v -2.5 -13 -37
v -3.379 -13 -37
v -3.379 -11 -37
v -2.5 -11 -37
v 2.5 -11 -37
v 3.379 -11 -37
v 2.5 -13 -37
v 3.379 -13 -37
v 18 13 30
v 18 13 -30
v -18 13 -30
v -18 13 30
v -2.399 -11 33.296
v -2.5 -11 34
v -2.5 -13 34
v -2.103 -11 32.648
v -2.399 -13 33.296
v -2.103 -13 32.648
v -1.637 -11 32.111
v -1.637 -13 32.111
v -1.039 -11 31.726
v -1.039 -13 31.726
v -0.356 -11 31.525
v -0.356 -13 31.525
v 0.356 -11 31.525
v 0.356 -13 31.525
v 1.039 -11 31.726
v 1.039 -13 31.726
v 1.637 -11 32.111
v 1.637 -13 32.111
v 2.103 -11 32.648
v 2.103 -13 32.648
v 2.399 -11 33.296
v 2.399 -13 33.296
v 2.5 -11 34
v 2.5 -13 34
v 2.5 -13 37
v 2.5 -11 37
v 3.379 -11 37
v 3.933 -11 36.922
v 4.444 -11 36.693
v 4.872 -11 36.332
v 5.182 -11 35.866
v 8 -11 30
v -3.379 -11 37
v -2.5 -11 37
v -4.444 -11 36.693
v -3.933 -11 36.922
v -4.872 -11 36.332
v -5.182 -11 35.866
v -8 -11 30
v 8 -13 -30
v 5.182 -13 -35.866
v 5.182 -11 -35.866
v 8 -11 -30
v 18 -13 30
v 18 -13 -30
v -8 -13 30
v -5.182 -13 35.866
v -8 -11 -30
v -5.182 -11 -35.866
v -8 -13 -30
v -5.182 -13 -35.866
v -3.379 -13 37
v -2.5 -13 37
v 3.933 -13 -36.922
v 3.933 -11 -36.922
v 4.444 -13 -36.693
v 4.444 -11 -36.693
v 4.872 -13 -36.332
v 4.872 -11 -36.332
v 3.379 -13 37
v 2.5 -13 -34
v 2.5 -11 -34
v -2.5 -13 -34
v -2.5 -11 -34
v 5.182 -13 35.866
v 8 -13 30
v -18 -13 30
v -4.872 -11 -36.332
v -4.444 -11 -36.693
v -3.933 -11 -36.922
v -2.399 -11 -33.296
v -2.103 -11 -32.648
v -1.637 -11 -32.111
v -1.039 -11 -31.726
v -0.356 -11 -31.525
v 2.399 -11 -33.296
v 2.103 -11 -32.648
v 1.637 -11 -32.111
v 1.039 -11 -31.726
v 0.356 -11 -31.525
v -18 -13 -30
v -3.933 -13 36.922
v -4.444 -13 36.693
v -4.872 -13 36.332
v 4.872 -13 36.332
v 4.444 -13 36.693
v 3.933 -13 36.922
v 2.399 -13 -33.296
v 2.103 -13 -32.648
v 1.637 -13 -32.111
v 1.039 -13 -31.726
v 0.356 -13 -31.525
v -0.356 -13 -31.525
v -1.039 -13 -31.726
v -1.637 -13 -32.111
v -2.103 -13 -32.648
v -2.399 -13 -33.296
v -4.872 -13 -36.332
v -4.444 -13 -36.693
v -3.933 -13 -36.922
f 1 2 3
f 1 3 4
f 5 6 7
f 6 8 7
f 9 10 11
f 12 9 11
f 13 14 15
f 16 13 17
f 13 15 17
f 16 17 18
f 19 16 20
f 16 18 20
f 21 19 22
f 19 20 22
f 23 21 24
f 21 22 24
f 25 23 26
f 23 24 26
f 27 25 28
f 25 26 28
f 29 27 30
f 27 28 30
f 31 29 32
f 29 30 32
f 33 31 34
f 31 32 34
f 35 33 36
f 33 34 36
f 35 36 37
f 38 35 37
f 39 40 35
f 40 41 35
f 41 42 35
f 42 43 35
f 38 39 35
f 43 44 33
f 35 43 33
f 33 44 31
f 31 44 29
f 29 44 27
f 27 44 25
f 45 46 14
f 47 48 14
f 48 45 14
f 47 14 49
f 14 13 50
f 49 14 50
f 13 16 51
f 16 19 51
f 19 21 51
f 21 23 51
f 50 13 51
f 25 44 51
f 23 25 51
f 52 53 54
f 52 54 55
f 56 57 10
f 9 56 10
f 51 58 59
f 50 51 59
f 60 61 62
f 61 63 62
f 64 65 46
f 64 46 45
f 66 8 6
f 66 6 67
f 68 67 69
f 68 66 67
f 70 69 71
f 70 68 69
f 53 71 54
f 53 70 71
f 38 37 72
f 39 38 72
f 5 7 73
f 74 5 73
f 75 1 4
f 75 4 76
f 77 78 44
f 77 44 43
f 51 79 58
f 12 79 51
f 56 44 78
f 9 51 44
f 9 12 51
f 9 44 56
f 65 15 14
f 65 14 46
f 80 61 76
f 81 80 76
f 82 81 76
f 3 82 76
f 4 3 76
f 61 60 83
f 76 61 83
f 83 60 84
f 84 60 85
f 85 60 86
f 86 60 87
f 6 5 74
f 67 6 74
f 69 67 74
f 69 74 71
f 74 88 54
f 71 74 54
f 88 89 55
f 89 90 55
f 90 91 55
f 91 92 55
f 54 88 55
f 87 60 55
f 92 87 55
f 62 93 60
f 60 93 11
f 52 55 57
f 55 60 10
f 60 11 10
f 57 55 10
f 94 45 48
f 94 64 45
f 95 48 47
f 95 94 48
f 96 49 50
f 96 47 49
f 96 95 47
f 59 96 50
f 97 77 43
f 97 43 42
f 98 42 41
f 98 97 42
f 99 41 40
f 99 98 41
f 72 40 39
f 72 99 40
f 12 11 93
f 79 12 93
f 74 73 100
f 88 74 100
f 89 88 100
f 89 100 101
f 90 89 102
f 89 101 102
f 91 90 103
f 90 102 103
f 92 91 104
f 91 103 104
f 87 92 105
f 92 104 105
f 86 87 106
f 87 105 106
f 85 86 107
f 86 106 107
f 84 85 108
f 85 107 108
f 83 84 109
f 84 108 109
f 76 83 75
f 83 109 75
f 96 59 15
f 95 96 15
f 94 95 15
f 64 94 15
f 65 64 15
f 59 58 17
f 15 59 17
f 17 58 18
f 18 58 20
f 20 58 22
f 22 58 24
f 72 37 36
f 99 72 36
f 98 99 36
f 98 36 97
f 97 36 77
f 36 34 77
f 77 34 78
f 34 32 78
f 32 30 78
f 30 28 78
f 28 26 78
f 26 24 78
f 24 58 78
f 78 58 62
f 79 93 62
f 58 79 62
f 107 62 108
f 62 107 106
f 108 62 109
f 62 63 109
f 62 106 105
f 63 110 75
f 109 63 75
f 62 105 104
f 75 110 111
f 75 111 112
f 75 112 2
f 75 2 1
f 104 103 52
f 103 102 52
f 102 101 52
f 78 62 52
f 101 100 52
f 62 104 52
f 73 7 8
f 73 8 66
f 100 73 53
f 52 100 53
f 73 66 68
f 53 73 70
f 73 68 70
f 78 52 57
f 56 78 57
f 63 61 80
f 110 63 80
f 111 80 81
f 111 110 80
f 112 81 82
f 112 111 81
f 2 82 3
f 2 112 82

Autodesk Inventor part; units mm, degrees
ref_plane "YZ Plane" through (0, 0, 0) normal (1, 0, 0) x (0, 1, 0)
ref_plane "XZ Plane" through (0, 0, 0) normal (0, 1, 0) x (-1, 0, 0)
ref_plane "XY Plane" through (0, 0, 0) normal (0, 0, 1) x (1, 0, 0)
sketch "草图1" plane through (0, 0, 0) normal (0, 0, 1) x (1, 0, 0)
  line L0 (-18, -13) -> (18, -13)
  line L1 (18, -13) -> (18, 13)
  line L2 (18, 13) -> (-18, 13)
  line L3 (-18, 13) -> (-18, -13)
  point P0 (0, 0)
  point P1 (0, 13)
  point P2 (-18, 0)
  dimension "d0" = 36
  dimension "d1" = 26
extrude "拉伸1" add sketch "草图1" along normal mid plane 60
sketch "草图2" plane through (-18, -13, -30) normal (0, -1, 0) x (1, 0, 0)
  line L0 (0, 0) -> (0, 60) projected
  line L1 (36, 60) -> (0, 60) projected
  line L2 (36, 0) -> (0, 0) projected
  arc A0 (20.5, -4) -> (18, -1.5) centre (18, -4) ccw
  line L3 (21.3793, -7) -> (20.5, -7)
  line L4 (20.5, -7) -> (20.5, -4)
  line L5 (23.1821, -5.866) -> (26, 0)
  arc A1 (18, -1.5) -> (15.5, -4) centre (18, -4) ccw
  line L6 (14.6207, -7) -> (15.5, -7)
  line L7 (15.5, -7) -> (15.5, -4)
  line L8 (12.8179, -5.866) -> (10, 0)
  arc A2 (21.3793, -7) -> (23.1821, -5.866) centre (21.3793, -5) ccw
  arc A3 (12.8179, -5.866) -> (14.6207, -7) centre (14.6207, -5) ccw
  point P0 (18, 30)
  point P1 (22.6373, 30)
  point P2 (0, 30)
  point P3 (18, 0)
  point P4 (18, 30)
  point P5 (0, 30)
  point P6 (18, 0)
  point P7 (10, 0)
  dimension "d6" = 5
  dimension "d9" = 2
extrude "拉伸2" add sketch "草图2" against normal blind 2
mirror "镜像1" about plane through (0, 0, 0) normal (0, 0, 1) of "拉伸2"
properties part number "DC_DC_POWER"
